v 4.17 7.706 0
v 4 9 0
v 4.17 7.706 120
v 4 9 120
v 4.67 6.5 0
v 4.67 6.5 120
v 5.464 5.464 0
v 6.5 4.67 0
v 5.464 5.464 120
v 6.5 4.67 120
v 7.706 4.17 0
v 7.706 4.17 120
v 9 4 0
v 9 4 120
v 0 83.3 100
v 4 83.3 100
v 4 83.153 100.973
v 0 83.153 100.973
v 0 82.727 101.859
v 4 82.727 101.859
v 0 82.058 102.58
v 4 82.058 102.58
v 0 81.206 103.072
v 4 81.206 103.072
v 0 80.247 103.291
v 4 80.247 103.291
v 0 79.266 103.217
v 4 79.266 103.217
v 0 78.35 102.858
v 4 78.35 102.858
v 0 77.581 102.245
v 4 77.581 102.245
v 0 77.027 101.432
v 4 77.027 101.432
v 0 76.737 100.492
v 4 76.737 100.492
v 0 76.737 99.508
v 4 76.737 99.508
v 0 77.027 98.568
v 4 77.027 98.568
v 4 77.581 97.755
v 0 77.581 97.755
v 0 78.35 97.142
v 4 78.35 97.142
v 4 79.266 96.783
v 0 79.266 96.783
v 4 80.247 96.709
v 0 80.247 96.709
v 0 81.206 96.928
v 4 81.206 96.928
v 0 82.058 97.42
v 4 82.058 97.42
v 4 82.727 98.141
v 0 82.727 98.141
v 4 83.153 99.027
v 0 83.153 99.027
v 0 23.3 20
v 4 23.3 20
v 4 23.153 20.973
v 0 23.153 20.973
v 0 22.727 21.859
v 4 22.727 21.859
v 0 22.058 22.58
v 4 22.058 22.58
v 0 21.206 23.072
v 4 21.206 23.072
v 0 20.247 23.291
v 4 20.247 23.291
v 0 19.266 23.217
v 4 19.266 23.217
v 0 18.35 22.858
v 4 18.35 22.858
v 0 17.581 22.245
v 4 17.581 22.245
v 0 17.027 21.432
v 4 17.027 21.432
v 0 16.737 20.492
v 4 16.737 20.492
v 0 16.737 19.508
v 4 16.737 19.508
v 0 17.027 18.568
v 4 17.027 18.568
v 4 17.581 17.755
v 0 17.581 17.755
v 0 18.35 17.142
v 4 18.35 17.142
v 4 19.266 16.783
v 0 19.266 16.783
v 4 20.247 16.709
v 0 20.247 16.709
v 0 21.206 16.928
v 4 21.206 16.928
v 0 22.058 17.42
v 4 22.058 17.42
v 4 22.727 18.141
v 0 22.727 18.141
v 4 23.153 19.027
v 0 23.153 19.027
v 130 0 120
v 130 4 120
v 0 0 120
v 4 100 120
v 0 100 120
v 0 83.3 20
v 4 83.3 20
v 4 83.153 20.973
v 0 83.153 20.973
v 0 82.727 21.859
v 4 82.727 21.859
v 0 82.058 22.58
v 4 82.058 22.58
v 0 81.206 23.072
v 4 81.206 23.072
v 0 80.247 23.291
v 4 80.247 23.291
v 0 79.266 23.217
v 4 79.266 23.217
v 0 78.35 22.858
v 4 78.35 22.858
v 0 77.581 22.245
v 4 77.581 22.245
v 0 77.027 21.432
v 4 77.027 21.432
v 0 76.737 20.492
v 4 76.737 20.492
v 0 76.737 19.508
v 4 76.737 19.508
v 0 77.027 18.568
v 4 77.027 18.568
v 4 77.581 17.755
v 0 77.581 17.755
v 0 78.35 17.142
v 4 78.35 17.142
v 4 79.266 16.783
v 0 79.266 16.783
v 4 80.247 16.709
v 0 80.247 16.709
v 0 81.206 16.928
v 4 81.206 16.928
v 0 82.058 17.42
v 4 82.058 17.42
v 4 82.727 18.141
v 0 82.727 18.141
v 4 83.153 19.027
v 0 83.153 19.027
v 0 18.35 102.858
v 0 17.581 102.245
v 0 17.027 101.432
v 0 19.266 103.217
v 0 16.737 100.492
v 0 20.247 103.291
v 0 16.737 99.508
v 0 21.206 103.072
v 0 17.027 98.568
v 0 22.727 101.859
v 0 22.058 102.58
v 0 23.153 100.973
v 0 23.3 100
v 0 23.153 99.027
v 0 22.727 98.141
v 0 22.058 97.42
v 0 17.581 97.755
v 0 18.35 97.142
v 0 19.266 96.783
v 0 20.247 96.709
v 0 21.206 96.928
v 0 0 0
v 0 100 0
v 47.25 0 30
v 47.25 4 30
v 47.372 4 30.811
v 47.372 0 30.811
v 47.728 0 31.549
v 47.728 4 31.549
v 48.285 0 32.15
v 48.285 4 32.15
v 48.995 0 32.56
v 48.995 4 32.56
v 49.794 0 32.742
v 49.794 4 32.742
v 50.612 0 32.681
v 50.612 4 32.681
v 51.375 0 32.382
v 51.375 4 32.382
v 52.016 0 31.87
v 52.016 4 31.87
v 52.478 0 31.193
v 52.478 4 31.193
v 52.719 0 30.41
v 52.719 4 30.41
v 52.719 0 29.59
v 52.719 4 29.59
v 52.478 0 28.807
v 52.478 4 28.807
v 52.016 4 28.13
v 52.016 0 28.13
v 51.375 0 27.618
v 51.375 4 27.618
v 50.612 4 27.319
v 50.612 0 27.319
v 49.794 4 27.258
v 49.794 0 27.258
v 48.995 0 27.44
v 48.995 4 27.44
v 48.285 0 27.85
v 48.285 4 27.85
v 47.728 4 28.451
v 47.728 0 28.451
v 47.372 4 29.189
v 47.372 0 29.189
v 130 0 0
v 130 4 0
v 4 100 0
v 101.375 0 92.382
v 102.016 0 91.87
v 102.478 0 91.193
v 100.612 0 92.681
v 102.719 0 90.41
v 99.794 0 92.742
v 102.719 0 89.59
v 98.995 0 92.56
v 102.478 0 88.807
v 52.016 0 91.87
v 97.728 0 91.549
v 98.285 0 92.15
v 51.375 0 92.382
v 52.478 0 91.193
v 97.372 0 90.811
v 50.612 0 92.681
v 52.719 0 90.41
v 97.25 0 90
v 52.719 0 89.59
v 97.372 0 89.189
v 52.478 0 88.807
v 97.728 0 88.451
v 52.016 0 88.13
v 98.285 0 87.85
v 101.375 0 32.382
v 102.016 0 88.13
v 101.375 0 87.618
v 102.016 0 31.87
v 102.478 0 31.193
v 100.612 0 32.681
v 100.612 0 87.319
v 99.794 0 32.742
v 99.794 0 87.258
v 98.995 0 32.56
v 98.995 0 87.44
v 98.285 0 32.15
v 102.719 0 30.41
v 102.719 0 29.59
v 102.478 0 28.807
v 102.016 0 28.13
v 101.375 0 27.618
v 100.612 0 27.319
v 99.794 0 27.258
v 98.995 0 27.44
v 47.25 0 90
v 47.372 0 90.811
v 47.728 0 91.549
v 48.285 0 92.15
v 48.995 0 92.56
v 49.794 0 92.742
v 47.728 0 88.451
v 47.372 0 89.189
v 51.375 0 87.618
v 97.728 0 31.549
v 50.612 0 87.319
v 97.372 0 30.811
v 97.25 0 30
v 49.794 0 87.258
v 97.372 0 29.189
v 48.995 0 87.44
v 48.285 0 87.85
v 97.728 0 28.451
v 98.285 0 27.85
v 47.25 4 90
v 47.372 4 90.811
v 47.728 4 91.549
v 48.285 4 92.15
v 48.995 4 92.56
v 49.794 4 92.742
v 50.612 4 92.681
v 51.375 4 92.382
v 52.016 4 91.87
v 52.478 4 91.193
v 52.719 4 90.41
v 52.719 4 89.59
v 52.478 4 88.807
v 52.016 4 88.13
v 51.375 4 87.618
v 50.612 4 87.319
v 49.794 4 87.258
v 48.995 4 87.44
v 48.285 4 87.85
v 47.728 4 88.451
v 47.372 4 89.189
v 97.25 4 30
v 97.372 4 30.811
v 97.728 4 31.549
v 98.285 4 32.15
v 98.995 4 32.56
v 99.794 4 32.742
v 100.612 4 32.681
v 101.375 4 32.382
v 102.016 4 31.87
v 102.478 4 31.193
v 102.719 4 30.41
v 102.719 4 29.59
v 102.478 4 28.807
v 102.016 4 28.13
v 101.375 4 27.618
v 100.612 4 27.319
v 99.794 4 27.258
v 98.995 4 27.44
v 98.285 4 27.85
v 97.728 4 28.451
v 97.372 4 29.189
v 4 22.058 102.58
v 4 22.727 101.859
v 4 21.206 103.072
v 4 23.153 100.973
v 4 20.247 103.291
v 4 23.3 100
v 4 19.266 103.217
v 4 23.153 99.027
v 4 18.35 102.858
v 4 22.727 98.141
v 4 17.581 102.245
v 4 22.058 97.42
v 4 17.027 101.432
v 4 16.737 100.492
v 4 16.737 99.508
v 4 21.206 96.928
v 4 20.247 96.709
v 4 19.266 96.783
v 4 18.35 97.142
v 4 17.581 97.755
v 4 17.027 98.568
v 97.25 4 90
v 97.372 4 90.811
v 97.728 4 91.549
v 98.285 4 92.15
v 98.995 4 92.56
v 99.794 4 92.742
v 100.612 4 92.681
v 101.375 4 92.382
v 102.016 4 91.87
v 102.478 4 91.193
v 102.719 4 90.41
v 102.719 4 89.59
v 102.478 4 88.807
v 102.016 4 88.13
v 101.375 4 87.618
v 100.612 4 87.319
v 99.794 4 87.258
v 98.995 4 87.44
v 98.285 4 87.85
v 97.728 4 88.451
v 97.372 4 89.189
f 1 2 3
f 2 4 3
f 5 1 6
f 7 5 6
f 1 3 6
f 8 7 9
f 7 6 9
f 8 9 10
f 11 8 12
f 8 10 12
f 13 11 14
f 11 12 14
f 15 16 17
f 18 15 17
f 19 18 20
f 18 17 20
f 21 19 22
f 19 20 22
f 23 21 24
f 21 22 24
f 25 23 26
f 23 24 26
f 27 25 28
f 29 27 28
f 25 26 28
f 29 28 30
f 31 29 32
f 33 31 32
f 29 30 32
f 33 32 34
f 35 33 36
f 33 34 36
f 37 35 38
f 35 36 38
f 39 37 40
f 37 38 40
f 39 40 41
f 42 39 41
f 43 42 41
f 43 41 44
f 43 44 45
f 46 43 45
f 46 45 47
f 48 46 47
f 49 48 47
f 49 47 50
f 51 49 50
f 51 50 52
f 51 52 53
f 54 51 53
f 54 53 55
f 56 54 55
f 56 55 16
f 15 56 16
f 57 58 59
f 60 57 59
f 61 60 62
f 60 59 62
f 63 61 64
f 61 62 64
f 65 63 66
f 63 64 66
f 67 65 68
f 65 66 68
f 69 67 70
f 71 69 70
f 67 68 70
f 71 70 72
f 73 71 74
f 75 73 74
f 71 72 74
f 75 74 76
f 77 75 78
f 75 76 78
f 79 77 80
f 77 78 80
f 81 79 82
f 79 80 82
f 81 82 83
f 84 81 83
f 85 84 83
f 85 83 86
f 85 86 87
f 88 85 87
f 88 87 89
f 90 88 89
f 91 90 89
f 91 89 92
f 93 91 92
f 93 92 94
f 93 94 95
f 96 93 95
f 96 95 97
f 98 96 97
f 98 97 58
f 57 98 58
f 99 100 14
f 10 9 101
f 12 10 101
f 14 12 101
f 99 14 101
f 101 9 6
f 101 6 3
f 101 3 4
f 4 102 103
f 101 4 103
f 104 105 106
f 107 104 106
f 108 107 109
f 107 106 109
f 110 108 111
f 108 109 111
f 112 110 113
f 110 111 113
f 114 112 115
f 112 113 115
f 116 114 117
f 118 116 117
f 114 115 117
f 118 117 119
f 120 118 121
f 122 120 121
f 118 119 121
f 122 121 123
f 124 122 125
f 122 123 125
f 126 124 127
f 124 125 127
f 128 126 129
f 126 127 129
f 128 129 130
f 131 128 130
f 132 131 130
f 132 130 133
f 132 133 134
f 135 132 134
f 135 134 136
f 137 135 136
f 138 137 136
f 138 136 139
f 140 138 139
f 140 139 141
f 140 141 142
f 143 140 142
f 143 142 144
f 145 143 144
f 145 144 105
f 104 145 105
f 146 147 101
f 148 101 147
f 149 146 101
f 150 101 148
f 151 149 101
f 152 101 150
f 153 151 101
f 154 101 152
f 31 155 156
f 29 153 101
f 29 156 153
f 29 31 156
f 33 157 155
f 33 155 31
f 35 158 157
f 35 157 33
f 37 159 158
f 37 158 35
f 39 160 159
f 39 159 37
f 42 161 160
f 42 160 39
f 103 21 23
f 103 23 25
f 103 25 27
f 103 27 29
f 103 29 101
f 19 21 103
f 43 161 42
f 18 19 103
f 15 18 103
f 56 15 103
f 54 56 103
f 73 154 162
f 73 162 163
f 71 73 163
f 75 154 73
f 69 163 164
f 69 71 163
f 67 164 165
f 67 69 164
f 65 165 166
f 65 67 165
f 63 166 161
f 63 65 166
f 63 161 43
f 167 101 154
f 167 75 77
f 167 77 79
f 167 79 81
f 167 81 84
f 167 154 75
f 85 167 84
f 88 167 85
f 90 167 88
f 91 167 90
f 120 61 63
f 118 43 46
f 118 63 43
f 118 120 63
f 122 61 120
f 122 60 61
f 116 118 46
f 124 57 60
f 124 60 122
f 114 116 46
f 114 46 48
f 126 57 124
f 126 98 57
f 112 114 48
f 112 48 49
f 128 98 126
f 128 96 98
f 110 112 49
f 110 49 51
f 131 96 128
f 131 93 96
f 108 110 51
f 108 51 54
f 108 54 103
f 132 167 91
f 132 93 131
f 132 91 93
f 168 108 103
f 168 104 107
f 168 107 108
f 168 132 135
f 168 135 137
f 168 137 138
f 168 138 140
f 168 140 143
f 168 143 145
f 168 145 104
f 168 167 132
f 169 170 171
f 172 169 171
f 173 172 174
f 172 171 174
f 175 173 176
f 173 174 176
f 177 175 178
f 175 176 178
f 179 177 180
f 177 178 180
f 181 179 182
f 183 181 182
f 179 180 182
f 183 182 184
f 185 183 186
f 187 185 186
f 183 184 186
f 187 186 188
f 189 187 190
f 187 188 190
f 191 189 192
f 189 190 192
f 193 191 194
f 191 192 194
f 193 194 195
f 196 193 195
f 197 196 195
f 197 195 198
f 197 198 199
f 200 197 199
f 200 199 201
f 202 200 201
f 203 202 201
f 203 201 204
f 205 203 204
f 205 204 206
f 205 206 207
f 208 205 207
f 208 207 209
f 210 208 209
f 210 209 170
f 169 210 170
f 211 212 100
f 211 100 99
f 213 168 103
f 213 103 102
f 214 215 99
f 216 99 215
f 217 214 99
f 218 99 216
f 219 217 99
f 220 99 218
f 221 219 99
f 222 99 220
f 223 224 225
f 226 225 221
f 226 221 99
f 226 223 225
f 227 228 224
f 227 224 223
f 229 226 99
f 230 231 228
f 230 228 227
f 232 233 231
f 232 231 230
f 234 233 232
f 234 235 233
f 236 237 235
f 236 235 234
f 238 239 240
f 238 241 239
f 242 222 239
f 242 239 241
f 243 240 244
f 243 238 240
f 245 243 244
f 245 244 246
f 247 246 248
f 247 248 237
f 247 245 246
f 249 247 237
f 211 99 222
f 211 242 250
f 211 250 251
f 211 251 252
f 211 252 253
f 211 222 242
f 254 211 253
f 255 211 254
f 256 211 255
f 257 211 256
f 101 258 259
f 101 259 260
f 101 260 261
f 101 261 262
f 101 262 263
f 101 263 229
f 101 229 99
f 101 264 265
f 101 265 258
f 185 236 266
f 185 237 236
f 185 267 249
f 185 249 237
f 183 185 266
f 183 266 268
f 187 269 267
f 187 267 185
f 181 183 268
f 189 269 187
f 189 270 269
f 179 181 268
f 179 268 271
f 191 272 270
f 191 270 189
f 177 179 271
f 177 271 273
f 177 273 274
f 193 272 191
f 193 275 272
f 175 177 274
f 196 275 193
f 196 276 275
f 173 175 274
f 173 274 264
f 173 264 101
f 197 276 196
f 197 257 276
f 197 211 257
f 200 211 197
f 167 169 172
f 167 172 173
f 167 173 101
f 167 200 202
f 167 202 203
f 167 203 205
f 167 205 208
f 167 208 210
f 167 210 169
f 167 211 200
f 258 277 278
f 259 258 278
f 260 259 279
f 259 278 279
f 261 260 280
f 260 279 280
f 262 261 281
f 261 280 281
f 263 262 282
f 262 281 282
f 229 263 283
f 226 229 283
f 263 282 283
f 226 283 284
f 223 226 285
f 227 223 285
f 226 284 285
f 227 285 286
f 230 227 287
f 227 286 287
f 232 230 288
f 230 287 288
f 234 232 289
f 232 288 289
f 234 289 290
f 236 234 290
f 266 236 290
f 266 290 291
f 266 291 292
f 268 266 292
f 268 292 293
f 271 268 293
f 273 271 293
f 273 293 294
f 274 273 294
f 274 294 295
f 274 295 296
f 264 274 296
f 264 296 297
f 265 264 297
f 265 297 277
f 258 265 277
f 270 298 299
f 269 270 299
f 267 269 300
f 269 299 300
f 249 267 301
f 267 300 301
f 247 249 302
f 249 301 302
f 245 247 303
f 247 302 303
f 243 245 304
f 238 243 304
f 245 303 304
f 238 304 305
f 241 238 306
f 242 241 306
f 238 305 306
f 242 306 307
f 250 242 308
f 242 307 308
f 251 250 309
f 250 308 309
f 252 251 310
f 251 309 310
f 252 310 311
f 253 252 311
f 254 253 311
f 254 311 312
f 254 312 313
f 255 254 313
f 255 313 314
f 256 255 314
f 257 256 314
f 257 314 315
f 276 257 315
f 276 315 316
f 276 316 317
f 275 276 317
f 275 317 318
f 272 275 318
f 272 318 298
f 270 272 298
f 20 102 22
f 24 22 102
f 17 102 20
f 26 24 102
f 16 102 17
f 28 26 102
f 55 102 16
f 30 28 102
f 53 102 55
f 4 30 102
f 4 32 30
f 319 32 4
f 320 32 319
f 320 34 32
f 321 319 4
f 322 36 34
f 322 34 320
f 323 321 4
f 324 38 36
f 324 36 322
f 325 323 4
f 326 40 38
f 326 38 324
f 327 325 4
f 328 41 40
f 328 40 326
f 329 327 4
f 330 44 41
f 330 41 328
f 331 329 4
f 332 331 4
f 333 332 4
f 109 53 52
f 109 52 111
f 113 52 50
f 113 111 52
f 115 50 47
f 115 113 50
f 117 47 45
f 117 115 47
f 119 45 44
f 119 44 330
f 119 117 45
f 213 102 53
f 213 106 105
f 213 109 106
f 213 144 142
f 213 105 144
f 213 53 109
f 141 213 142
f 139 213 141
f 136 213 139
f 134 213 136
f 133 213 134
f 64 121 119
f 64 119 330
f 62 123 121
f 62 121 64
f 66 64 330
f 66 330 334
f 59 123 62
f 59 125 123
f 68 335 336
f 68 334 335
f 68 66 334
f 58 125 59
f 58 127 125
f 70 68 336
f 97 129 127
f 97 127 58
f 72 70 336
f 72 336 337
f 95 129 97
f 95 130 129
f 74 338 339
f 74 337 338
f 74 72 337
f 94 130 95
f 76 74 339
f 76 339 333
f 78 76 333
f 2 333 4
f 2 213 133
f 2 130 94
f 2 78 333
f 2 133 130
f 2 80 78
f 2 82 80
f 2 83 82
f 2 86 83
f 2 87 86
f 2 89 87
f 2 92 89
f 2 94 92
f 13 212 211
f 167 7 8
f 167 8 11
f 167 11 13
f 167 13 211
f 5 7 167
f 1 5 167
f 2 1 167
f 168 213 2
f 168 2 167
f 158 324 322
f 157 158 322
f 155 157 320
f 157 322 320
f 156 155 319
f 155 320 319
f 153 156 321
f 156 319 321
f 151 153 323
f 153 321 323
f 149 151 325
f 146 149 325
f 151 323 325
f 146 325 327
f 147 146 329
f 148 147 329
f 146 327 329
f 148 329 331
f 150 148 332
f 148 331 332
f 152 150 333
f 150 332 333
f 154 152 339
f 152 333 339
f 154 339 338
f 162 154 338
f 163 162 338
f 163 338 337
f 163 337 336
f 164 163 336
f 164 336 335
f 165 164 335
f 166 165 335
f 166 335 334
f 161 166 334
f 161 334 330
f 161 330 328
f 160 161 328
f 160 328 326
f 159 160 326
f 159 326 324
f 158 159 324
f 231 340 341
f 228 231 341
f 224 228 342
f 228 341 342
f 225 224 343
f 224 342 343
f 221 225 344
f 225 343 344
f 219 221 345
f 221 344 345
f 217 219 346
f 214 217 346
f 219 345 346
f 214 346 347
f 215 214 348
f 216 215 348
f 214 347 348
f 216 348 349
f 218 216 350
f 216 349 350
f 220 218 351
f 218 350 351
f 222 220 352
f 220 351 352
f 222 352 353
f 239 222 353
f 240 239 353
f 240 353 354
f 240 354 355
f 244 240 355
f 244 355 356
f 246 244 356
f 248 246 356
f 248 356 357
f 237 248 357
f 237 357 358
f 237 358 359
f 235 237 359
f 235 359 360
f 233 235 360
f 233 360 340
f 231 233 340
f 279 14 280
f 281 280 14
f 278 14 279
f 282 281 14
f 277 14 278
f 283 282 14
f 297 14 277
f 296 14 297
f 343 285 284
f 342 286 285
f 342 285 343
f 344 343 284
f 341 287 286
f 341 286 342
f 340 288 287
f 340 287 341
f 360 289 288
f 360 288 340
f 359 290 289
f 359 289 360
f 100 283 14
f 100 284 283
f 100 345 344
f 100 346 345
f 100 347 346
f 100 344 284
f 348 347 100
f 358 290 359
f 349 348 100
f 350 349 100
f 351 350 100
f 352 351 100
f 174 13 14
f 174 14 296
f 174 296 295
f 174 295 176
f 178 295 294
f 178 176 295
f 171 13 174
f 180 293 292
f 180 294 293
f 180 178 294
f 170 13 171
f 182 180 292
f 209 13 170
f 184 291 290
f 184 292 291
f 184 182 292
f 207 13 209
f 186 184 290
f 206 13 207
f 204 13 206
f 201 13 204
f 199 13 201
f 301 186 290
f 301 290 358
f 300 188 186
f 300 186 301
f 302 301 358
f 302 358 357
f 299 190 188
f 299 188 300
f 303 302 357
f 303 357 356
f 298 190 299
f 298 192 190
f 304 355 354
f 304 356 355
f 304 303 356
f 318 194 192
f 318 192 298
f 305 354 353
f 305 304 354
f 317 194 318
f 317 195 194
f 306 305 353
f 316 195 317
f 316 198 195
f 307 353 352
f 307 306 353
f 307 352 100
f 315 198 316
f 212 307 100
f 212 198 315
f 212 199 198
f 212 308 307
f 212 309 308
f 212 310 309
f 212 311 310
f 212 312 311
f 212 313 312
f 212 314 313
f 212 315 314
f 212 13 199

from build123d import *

# Parameters (mm, degrees)
BOSS_EXTRUDE1_DEPTH = 120
SKETCH4_R           = 3.3
CUT_EXTRUDE1_DEPTH  = 201.688813839
SKETCH5_R           = 2.75
CUT_EXTRUDE2_DEPTH  = 202.285866369
FILLET1_R           = 5


with BuildPart() as part:
    # Sketch2 → Boss-Extrude1 (new body)
    with BuildSketch(Plane.XY):
        Polygon((0, 0), (0, 100), (4, 100), (4, 4), (130, 4), (130, 0), align=None)
    extrude(amount=BOSS_EXTRUDE1_DEPTH)

    # Sketch4 → Cut-Extrude1 (cut, through all)
    with BuildSketch(Plane(origin=(4, 0, 0), x_dir=(0, 0, -1), z_dir=(1, 0, 0))):
        with Locations(Location((-100, 80, 0), (0, 0, 90))):
            Circle(SKETCH4_R)
        with Locations(Location((-20, 80, 0), (0, 0, 90))):
            Circle(SKETCH4_R)
        with Locations(Location((-20, 20, 0), (0, 0, 90))):
            Circle(SKETCH4_R)
        with Locations(Location((-100, 20, 0), (0, 0, 90))):
            Circle(SKETCH4_R)
    extrude(amount=-CUT_EXTRUDE1_DEPTH, mode=Mode.SUBTRACT)

    # Sketch5 → Cut-Extrude2 (cut, through all)
    with BuildSketch(Plane(origin=(0, 4, 0), x_dir=(1, 0, 0), z_dir=(0, 1, 0))):
        with Locations(Location((100, -30, 0), (0, 0, 180))):
            Circle(SKETCH5_R)
        with Locations(Location((50, -30, 0), (0, 0, 180))):
            Circle(SKETCH5_R)
        with Locations(Location((50, -90, 0), (0, 0, 180))):
            Circle(SKETCH5_R)
        with Locations(Location((100, -90, 0), (0, 0, 180))):
            Circle(SKETCH5_R)
    extrude(amount=-CUT_EXTRUDE2_DEPTH, mode=Mode.SUBTRACT)

    # Fillet1
    fillet1_edges = [part.edges().sort_by_distance(p)[0] for p in [
        (4, 4, 60),
    ]]
    fillet(fillet1_edges, radius=FILLET1_R)


solid = part.part
